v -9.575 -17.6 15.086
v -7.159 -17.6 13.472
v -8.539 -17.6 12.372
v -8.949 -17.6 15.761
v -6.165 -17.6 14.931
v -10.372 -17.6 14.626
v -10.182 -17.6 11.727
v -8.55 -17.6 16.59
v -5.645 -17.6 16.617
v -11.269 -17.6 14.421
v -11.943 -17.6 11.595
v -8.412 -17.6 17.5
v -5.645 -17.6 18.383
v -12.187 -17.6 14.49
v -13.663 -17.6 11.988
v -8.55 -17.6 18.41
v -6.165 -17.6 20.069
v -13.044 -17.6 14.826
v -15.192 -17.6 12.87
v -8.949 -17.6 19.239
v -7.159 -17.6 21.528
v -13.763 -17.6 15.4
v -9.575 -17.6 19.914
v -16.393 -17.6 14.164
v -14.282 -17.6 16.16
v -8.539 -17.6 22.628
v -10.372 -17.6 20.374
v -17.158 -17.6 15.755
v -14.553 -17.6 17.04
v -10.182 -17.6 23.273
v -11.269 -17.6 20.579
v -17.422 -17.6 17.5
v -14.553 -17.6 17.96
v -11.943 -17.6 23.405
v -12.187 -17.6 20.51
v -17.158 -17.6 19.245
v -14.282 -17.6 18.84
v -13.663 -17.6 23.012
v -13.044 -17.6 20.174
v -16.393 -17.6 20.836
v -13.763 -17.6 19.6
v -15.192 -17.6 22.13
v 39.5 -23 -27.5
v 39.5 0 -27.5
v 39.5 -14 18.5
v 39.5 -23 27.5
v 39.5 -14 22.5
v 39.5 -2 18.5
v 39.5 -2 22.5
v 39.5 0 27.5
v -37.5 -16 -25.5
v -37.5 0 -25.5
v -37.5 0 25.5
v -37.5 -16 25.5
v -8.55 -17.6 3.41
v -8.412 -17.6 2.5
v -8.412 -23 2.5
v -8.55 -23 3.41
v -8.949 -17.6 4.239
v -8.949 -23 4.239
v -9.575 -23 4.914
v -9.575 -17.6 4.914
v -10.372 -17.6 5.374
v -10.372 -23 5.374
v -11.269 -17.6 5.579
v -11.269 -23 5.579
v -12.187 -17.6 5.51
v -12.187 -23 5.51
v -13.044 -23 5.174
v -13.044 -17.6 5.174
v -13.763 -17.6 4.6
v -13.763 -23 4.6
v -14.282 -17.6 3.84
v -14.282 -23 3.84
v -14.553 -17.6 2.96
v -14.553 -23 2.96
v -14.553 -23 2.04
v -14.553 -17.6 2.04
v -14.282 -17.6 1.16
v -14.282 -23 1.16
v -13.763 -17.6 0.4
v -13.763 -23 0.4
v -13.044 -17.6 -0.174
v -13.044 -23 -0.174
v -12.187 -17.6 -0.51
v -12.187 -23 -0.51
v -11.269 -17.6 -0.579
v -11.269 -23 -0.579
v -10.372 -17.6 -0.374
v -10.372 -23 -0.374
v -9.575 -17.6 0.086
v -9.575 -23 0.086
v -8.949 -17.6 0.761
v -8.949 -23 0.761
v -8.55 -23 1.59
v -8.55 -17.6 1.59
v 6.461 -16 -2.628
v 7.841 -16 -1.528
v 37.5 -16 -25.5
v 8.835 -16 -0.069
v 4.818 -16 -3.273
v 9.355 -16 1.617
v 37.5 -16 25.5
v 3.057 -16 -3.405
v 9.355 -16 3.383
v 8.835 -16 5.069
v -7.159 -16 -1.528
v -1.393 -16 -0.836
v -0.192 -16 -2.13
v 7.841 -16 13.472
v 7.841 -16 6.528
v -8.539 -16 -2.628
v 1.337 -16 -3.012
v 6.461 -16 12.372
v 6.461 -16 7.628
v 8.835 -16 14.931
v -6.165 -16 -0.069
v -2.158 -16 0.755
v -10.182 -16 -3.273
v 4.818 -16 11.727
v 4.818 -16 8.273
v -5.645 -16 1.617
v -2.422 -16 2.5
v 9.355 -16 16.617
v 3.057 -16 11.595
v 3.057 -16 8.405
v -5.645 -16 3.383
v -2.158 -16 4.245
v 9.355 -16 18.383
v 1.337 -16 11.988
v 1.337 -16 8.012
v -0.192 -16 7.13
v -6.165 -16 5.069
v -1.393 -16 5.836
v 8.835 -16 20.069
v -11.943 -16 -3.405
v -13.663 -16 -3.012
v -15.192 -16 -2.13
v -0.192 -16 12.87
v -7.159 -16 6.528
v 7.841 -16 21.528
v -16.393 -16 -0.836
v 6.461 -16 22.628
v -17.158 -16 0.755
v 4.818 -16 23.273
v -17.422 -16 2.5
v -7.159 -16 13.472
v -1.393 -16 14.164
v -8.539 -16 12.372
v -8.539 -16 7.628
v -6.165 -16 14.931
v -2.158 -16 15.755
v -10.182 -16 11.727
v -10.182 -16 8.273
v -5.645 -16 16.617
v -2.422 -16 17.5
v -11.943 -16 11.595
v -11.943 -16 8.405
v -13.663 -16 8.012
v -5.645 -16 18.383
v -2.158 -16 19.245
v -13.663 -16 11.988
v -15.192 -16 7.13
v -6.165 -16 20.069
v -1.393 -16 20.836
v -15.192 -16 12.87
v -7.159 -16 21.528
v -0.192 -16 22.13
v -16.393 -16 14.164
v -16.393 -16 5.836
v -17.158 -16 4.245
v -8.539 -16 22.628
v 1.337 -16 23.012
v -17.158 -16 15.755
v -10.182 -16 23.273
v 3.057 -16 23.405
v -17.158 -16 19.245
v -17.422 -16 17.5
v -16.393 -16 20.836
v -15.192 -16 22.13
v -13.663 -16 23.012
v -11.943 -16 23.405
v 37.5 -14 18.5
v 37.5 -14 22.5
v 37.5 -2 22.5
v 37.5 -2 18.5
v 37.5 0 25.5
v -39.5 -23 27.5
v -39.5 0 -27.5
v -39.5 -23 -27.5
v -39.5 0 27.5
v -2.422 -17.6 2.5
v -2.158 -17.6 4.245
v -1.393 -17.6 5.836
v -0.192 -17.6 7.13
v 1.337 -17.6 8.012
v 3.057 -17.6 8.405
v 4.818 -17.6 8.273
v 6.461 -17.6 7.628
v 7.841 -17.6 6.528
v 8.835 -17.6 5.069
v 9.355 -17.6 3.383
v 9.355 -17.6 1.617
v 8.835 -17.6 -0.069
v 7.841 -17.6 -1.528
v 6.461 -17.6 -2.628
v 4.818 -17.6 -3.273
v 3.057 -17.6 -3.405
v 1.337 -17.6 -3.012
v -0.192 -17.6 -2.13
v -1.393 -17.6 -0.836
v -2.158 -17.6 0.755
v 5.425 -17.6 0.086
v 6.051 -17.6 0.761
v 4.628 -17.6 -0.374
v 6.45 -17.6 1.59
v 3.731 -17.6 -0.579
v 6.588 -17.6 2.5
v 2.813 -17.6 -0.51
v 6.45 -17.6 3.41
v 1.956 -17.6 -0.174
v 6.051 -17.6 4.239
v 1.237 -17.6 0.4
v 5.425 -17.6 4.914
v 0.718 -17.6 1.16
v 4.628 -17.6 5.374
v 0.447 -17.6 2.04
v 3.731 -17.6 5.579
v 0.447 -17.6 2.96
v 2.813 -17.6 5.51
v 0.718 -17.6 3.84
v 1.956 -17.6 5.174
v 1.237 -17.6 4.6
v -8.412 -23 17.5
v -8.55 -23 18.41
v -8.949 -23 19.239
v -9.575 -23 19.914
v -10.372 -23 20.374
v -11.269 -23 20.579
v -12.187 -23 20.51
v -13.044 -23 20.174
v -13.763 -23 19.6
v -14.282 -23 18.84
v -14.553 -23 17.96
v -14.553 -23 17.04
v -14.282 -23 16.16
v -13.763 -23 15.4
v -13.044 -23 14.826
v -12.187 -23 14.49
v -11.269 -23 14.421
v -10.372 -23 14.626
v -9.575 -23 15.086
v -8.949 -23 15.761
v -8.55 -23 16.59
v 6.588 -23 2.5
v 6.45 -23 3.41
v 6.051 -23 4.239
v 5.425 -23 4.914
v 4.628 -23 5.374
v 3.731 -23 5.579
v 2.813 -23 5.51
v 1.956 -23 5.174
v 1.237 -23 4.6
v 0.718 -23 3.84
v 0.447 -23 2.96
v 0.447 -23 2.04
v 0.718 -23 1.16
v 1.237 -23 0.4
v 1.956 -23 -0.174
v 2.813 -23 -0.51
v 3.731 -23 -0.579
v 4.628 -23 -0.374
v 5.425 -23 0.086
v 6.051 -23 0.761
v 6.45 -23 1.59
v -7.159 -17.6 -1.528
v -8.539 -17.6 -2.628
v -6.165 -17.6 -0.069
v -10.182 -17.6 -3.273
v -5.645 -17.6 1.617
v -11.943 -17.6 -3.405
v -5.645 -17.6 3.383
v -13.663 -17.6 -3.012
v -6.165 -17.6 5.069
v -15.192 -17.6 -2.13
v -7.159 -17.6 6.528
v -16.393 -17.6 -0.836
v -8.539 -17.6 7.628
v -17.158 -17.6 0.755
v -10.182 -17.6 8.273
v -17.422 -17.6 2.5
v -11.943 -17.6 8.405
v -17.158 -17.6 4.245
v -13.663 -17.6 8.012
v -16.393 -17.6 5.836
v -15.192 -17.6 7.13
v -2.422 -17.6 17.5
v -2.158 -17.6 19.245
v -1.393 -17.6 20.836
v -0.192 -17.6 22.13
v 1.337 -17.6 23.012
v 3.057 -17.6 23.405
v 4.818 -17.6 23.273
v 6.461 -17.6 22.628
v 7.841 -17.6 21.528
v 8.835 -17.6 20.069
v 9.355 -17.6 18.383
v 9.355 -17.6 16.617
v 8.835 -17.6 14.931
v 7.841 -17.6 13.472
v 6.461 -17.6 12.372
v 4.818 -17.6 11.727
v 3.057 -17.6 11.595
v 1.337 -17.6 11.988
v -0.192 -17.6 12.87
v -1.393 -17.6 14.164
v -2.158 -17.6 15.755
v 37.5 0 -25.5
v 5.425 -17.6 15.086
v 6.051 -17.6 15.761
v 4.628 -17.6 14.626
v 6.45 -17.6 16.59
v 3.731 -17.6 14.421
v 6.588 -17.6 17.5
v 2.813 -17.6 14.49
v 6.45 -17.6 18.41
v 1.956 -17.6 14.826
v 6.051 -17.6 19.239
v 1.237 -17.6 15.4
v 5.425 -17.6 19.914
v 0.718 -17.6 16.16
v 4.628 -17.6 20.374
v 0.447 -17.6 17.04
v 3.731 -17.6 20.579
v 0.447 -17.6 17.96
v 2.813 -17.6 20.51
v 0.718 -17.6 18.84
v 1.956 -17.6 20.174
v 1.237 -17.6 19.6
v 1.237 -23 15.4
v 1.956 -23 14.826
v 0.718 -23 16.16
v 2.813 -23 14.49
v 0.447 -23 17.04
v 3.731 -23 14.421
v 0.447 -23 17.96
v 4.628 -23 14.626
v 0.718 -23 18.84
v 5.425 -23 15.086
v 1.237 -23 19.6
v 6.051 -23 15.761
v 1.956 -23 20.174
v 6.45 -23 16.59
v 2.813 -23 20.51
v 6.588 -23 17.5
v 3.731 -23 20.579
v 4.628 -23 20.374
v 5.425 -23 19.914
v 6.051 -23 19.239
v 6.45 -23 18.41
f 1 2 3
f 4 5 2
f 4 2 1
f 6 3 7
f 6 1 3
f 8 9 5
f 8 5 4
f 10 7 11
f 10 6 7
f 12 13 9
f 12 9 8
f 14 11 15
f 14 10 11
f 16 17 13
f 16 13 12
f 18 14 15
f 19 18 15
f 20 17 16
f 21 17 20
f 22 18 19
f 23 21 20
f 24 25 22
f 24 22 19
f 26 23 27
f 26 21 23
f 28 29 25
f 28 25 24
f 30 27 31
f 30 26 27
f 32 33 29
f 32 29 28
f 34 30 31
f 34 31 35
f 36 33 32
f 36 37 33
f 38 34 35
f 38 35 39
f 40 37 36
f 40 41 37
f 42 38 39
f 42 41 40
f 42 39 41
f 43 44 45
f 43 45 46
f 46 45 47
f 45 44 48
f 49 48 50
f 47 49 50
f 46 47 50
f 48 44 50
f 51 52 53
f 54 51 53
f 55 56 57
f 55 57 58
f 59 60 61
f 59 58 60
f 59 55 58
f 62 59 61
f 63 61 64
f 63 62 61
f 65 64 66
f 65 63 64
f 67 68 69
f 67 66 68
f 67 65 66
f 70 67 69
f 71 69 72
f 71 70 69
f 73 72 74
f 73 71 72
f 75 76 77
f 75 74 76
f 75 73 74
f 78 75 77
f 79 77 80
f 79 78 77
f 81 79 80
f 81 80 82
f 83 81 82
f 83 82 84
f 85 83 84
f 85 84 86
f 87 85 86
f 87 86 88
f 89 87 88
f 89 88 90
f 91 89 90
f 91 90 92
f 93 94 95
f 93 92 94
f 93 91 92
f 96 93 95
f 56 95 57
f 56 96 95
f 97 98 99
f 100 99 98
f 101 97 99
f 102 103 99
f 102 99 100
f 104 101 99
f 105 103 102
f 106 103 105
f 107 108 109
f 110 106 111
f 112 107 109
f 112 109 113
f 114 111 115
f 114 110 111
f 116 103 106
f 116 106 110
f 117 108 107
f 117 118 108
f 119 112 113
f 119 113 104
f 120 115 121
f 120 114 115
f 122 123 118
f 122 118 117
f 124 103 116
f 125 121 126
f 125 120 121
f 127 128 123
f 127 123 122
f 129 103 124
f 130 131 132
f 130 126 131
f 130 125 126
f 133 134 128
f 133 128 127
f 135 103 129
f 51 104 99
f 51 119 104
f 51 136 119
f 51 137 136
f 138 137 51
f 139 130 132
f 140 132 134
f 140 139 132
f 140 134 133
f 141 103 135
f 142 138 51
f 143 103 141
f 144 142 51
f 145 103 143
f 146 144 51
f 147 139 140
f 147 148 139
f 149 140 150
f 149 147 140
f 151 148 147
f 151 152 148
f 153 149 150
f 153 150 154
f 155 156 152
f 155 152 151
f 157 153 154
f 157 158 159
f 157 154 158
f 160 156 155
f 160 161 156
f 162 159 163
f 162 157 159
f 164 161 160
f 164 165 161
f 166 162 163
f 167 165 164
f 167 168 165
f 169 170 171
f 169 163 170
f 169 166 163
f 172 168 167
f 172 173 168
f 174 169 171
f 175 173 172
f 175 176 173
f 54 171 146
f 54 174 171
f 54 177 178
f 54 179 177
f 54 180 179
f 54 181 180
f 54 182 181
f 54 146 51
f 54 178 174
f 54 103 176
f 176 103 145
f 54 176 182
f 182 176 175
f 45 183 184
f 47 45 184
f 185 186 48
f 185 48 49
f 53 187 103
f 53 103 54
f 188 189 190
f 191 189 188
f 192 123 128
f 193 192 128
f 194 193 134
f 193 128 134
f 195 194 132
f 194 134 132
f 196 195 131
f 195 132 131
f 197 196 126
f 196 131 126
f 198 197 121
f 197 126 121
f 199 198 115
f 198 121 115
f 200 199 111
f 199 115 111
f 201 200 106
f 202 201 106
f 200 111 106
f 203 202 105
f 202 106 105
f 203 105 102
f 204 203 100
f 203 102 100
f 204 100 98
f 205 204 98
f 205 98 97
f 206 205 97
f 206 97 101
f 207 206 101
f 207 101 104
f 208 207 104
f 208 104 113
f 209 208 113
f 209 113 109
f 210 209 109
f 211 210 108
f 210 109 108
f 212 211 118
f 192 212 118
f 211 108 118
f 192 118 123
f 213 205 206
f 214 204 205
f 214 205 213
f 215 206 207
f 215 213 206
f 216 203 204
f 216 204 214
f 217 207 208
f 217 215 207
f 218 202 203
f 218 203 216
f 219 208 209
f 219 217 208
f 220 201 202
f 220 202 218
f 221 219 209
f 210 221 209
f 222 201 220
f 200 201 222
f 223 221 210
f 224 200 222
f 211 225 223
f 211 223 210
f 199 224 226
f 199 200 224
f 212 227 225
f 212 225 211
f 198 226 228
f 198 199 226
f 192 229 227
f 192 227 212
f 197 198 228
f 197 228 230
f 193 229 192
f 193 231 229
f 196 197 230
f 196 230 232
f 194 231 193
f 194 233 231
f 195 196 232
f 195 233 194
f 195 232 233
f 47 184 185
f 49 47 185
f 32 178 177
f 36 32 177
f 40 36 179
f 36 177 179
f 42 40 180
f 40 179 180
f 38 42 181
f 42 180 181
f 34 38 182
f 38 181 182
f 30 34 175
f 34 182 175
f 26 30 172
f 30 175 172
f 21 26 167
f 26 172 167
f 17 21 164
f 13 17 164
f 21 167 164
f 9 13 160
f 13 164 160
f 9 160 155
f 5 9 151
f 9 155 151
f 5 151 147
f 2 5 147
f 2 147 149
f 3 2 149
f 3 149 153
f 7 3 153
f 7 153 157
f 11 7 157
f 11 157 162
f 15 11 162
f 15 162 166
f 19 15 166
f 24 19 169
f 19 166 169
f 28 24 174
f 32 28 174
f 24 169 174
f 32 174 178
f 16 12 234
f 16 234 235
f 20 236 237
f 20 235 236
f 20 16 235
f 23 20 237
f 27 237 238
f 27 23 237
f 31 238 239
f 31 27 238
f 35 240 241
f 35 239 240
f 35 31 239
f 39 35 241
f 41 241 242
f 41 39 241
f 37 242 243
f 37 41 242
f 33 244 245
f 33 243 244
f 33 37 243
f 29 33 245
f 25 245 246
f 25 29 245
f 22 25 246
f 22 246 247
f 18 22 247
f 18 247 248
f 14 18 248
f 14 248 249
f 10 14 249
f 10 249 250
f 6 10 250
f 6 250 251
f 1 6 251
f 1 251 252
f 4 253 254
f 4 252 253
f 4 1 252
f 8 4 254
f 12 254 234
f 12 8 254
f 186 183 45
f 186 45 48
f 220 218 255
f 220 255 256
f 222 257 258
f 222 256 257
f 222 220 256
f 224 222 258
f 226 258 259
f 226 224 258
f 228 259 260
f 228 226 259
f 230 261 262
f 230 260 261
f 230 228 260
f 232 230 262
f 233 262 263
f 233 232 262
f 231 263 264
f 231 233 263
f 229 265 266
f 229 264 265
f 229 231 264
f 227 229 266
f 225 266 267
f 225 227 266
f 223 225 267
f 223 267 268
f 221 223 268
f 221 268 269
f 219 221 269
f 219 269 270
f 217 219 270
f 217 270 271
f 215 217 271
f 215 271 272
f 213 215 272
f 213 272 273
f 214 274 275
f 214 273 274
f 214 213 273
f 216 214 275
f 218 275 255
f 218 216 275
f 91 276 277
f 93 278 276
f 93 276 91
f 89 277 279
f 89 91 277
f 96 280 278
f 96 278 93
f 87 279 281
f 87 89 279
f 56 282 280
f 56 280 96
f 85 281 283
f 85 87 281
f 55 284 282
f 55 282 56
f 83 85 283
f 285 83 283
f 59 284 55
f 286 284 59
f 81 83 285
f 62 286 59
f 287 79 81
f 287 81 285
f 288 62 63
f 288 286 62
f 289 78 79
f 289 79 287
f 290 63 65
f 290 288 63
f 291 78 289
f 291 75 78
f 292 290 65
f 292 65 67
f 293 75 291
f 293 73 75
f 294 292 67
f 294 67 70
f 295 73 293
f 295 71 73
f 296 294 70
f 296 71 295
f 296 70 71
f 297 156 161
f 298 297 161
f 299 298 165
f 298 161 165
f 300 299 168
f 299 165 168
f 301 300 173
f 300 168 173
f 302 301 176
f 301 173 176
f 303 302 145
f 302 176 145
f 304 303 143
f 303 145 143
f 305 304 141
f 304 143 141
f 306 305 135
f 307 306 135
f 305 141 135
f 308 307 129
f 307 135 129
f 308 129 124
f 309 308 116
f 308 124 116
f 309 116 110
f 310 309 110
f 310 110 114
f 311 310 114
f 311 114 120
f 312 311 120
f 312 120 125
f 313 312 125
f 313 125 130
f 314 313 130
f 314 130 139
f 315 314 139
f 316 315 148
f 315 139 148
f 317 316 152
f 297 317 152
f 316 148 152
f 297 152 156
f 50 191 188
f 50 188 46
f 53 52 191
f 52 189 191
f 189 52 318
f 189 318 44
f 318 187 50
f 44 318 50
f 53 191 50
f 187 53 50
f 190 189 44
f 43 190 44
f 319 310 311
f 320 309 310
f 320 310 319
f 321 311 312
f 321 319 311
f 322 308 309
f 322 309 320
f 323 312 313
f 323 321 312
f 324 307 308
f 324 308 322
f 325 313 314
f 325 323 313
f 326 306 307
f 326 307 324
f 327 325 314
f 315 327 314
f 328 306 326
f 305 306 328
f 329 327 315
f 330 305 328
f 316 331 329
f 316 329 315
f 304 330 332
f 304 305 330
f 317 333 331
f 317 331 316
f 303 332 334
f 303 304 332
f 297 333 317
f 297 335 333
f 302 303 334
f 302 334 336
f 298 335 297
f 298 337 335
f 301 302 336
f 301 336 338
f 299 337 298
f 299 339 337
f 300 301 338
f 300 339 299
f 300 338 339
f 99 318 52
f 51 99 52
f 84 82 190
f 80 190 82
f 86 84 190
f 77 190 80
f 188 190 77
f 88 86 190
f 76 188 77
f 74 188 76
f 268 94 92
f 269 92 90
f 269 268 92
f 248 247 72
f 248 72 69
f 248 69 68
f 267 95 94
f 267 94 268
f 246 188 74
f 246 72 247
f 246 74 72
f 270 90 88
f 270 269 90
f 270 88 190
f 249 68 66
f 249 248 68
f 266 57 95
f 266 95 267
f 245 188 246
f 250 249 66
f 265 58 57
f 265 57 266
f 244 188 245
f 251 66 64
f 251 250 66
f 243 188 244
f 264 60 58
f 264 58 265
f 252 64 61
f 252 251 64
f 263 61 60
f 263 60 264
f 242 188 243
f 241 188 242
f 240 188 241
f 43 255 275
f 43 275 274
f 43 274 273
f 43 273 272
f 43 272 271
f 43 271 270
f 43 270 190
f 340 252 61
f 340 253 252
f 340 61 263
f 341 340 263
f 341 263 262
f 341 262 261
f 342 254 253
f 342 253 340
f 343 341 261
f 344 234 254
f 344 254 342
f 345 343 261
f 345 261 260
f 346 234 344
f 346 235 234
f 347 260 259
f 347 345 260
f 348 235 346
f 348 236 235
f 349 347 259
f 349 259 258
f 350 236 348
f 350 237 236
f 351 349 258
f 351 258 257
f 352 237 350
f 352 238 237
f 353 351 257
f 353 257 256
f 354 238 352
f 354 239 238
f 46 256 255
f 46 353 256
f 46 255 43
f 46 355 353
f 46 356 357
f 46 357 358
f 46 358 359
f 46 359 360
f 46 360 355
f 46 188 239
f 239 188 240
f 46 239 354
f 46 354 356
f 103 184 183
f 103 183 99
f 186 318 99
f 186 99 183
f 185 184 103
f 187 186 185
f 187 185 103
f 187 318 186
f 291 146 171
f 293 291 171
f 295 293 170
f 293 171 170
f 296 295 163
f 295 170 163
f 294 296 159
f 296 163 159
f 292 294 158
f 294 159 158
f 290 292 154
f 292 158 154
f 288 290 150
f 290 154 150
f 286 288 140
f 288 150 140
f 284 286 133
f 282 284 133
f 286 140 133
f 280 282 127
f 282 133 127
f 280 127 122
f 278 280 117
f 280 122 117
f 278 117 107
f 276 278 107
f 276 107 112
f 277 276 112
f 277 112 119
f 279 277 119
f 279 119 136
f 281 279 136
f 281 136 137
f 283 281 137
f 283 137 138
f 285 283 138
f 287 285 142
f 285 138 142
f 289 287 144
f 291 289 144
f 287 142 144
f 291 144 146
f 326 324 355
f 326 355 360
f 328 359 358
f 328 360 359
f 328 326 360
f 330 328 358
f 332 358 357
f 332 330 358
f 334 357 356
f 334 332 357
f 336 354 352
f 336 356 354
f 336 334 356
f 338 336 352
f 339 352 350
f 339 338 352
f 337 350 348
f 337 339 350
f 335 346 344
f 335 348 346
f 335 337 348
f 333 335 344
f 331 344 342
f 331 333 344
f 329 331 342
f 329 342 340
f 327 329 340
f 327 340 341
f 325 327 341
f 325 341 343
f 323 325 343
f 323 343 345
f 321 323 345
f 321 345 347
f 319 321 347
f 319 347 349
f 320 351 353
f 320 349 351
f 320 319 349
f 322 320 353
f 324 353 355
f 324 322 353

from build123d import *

# Parameters (mm, degrees)
F0_W     = 79
F0_H     = 55
F1_DEPTH = 23
F2_W     = 75
F2_H     = 51
F3_DEPTH = 16
F4_W     = 12
F4_H     = 4
F5_DEPTH = 55
F6_R     = 3.0875
F7_DEPTH = 25
F8_R     = 5.9215
F9_DEPTH = 1.6


with BuildPart() as f1:
    # F0 (on Front) → F1 (new body)
    with BuildSketch(Plane.XZ):
        Rectangle(F0_W, F0_H)
    extrude(amount=F1_DEPTH)

    # F2 (on face) → F3 (cut)
    with BuildSketch(Plane(origin=(0, 0, 0), x_dir=(-1, 0, 0), z_dir=(0, 1, 0))):
        Rectangle(F2_W, F2_H)
    extrude(amount=-F3_DEPTH, mode=Mode.SUBTRACT)

    # F4 (on Right) → F5 (cut)
    with BuildSketch(Plane.YZ):
        with Locations((-8, 20.5)):
            Rectangle(F4_W, F4_H)
    extrude(amount=F5_DEPTH, mode=Mode.SUBTRACT)

    # F6 (on Front) → F7 (cut)
    with BuildSketch(Plane.XZ):
        with Locations((-11.5, 17.5)):
            Circle(F6_R)
        with Locations((-11.5, 2.5)):
            Circle(F6_R)
        with Locations((3.5, 2.5)):
            Circle(F6_R)
        with Locations((3.5, 17.5)):
            Circle(F6_R)
    extrude(amount=F7_DEPTH, mode=Mode.SUBTRACT)

    # F8 (on face) → F9 (cut)
    with BuildSketch(Plane(origin=(0, -16, 0), x_dir=(-1, 0, 0), z_dir=(0, 1, 0))):
        with Locations((-3.5, 17.5)):
            Circle(F8_R)
        with Locations((-3.5, 2.5)):
            Circle(F8_R)
        with Locations((11.5, 2.5)):
            Circle(F8_R)
        with Locations((11.5, 17.5)):
            Circle(F8_R)
    extrude(amount=-F9_DEPTH, mode=Mode.SUBTRACT)


solid = f1.part
